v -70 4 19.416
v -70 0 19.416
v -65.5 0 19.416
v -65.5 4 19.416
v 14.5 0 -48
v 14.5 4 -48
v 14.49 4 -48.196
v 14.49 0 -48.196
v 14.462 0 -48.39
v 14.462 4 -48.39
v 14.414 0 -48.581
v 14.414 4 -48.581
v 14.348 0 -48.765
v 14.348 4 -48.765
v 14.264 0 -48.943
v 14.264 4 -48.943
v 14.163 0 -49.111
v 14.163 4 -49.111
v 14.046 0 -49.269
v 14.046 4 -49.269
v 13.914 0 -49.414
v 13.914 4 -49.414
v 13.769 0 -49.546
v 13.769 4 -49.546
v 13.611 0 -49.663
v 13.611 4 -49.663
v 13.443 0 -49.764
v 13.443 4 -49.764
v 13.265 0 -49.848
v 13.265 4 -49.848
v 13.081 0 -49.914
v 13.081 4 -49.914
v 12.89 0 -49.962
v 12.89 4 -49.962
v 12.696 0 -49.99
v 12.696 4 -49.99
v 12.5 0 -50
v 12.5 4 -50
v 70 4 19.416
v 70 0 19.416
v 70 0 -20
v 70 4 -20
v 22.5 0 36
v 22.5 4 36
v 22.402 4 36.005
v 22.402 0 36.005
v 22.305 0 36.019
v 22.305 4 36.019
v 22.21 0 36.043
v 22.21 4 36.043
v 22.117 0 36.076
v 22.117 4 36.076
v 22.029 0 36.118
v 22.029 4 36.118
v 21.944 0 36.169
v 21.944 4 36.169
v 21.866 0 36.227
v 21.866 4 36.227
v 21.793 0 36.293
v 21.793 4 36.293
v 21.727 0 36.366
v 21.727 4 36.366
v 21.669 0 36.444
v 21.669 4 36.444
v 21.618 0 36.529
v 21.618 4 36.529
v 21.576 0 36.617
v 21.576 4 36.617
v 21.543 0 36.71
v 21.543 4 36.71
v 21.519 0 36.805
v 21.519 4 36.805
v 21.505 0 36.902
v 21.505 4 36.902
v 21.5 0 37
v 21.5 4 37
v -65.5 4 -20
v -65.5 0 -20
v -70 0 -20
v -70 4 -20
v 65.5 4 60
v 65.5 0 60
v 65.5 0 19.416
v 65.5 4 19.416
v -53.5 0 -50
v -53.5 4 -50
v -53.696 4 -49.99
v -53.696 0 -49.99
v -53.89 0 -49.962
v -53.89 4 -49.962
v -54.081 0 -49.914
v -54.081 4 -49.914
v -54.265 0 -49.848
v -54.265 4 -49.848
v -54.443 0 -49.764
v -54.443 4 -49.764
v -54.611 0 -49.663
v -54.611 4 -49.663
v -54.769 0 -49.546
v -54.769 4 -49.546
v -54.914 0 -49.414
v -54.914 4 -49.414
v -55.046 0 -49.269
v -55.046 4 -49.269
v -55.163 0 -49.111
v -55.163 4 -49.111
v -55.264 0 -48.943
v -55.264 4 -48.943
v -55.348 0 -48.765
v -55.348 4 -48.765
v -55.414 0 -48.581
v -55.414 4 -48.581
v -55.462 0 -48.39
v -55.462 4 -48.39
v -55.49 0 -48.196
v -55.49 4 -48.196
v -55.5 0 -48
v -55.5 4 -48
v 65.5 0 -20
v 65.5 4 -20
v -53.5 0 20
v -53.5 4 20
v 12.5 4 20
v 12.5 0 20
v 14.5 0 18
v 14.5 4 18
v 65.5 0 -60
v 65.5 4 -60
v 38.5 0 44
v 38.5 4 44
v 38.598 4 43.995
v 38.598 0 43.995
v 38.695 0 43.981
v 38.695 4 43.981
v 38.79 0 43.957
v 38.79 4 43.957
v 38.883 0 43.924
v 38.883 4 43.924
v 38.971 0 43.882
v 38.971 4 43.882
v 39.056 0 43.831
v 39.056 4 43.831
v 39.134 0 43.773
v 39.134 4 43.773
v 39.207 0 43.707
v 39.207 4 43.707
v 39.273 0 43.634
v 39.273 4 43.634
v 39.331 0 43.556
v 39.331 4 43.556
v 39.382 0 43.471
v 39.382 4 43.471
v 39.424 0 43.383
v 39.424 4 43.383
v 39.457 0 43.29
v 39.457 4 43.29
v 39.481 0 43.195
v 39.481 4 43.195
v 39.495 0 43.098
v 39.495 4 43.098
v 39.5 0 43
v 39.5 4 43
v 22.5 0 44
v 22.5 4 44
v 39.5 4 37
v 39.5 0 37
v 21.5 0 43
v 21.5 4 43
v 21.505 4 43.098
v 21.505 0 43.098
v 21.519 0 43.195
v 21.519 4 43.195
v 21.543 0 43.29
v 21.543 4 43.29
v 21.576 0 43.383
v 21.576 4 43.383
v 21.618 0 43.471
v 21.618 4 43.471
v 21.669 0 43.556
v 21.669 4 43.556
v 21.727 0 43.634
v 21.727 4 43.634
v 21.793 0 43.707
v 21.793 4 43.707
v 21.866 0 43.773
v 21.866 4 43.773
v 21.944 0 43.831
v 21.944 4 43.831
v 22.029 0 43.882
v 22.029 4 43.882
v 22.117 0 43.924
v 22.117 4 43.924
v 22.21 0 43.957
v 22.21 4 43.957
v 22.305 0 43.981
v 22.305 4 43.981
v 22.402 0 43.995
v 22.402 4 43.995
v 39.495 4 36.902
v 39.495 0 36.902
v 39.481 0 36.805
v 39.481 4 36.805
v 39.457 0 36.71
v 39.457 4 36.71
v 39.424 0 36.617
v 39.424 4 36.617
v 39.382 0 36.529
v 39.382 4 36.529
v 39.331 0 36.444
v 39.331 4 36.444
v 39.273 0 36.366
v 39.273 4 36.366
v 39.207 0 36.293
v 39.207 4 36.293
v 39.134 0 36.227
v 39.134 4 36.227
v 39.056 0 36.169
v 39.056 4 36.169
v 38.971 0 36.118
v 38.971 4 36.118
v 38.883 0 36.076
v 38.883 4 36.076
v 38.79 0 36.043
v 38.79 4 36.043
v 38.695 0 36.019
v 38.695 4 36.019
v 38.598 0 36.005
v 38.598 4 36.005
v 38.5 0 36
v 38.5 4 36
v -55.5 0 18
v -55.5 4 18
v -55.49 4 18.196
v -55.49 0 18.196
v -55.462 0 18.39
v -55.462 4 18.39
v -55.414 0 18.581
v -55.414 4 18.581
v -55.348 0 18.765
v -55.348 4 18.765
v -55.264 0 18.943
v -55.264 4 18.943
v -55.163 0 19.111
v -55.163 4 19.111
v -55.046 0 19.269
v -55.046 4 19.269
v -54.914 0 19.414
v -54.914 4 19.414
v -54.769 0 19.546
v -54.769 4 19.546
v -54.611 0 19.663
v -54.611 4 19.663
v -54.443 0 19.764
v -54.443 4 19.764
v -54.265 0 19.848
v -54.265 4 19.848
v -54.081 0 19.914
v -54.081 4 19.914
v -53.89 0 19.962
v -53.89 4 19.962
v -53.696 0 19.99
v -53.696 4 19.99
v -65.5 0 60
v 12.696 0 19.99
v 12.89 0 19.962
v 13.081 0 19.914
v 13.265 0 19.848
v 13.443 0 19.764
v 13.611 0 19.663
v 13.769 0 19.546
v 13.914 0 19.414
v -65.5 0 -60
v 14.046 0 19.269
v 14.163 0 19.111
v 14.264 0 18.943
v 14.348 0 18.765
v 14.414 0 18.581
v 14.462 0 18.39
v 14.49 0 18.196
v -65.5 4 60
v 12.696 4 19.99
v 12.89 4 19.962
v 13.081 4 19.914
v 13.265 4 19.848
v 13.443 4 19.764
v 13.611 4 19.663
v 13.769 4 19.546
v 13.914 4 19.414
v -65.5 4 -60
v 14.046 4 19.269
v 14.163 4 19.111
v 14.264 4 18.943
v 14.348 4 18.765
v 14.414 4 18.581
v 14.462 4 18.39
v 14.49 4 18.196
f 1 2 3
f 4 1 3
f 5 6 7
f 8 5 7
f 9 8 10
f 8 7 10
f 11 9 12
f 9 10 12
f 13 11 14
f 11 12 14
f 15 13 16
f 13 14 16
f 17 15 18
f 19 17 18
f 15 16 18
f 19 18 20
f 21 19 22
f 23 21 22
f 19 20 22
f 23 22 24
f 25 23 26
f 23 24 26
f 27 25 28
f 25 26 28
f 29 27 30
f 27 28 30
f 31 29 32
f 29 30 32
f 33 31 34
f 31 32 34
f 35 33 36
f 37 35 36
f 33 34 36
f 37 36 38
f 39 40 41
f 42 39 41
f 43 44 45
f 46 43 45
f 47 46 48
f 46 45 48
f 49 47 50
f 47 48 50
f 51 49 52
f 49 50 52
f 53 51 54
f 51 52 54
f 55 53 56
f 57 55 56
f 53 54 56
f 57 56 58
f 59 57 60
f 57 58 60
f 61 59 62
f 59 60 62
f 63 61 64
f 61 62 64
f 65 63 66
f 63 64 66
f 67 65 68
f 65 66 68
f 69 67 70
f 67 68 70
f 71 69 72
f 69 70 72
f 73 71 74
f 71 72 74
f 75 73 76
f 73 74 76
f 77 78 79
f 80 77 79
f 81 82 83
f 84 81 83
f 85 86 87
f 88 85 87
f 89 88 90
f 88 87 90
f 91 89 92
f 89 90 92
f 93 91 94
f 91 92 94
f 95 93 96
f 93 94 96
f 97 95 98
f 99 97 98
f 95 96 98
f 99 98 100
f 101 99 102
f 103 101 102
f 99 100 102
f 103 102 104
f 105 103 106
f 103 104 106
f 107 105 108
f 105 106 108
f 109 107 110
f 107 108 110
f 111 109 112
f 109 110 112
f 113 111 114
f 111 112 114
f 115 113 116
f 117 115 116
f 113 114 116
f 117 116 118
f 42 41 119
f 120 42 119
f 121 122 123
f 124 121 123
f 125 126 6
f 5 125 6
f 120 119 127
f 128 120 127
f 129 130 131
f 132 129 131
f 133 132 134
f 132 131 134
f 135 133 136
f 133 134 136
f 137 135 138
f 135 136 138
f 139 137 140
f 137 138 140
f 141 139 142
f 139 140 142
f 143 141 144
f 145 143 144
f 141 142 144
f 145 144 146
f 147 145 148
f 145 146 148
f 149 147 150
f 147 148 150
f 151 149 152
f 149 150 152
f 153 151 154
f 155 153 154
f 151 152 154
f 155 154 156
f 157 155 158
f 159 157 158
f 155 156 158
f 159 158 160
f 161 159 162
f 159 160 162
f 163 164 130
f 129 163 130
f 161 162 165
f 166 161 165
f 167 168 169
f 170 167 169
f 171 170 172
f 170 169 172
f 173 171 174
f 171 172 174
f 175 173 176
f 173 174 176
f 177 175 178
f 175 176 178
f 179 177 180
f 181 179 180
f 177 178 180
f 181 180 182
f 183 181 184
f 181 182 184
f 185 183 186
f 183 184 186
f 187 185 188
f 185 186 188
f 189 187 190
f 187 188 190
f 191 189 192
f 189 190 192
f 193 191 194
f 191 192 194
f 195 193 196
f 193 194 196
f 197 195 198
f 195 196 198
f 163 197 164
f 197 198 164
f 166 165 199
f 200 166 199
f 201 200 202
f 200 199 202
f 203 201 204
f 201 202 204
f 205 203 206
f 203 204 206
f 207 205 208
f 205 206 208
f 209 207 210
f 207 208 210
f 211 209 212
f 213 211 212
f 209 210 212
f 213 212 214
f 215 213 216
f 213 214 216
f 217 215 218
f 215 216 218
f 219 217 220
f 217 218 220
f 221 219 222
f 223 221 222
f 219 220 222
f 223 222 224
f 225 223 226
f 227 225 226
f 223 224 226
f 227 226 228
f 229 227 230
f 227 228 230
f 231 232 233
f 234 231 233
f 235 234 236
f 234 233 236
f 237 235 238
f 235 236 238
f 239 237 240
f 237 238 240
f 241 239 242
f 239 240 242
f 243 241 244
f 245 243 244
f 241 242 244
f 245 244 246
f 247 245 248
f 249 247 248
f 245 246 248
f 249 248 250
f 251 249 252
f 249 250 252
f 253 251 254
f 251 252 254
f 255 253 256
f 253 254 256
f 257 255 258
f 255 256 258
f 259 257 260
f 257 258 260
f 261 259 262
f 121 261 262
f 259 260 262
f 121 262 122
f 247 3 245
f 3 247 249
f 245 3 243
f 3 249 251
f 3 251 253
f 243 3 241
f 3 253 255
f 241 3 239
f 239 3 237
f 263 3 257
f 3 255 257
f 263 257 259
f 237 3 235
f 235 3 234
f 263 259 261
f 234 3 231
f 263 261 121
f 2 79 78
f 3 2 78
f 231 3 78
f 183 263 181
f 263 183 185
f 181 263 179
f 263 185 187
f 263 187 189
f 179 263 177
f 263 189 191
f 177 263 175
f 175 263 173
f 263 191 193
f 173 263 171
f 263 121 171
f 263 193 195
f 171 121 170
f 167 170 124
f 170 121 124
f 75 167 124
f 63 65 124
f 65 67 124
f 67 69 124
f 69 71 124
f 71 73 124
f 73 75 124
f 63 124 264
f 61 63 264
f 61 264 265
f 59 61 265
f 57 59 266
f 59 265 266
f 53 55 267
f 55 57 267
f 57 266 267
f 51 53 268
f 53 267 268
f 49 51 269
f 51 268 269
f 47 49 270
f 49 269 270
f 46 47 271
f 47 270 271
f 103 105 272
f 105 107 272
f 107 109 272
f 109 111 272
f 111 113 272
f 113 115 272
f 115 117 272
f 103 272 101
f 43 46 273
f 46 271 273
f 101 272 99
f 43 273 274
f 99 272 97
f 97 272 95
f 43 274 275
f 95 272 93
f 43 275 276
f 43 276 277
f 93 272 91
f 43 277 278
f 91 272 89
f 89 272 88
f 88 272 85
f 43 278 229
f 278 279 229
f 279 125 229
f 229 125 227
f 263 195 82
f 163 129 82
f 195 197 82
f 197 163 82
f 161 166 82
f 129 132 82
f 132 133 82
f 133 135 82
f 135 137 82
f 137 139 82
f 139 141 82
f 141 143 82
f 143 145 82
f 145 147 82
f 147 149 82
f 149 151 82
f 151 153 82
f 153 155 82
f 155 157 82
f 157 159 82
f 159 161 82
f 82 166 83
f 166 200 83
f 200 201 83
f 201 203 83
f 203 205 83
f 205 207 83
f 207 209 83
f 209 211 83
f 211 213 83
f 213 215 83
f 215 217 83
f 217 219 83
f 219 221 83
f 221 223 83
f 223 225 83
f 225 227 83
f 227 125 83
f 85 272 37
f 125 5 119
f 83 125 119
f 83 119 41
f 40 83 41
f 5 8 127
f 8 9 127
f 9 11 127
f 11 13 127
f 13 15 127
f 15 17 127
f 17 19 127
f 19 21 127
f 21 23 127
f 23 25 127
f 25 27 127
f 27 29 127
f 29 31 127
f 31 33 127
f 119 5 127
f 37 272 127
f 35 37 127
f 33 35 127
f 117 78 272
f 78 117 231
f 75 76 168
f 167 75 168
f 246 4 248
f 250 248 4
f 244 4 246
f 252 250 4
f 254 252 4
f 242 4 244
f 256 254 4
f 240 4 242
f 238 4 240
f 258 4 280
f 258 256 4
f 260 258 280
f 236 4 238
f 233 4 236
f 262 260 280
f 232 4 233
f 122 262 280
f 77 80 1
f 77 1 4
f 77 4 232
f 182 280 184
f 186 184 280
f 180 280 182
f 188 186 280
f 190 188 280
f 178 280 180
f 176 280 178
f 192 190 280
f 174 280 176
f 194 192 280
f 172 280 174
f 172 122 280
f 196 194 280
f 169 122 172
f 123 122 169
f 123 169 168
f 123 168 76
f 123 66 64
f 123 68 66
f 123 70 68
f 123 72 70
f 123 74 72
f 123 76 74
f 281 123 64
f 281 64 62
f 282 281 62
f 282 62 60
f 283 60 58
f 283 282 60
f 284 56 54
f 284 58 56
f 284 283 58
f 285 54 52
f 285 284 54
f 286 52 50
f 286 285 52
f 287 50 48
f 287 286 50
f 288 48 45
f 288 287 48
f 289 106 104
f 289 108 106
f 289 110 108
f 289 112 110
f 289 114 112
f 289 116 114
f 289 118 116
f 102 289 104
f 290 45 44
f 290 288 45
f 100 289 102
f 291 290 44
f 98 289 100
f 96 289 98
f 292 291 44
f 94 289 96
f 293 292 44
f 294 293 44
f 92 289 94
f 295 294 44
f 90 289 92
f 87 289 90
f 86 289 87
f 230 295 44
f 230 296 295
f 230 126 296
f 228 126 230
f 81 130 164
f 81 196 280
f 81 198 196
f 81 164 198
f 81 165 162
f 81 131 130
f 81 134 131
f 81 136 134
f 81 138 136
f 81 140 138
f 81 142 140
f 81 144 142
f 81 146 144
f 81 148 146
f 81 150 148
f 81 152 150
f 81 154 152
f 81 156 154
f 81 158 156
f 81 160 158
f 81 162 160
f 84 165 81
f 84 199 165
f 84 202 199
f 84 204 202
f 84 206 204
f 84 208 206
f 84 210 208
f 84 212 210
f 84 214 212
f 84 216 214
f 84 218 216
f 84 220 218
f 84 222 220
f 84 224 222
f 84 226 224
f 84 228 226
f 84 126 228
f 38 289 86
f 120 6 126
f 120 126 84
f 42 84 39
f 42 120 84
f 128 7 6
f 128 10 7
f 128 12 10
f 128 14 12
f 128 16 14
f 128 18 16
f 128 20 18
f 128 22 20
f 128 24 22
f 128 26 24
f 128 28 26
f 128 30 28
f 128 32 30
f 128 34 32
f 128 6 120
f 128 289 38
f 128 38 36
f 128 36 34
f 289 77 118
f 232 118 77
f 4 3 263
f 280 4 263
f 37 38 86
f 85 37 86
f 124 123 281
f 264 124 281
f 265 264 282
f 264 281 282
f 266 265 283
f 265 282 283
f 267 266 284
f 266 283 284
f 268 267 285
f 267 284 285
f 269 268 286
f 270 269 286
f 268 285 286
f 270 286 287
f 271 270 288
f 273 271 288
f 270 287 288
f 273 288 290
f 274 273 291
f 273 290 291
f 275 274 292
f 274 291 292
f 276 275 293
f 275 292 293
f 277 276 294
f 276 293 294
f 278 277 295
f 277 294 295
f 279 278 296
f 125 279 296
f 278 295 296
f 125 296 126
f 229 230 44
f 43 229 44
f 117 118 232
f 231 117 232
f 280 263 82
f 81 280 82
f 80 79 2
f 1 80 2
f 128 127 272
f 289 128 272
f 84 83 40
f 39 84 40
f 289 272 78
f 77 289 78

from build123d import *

# Parameters (mm, degrees)
BOSS_EXTRUDE1_DEPTH = 4
CUT_EXTRUDE1_DEPTH  = 5


with BuildPart() as part:
    # Sketch1 → Boss-Extrude1 (new body)
    with BuildSketch(Plane(origin=(0, 0, 0), x_dir=(1, 0, 0), z_dir=(0, 1, 0))):
        Polygon((-65.5, 20), (-70, 20), (-70, -19.415515436), (-65.5, -19.415515436), (-65.5, -60), (65.5, -60), (65.5, -19.415515436), (70, -19.415515436), (70, 20), (65.5, 20), (65.5, 60), (-65.5, 60), align=None)
    extrude(amount=BOSS_EXTRUDE1_DEPTH)

    # Sketch2 → Cut-Extrude1 (cut)
    with BuildSketch(Plane(origin=(0, 4, 0), x_dir=(1, 0, 0), z_dir=(0, 1, 0))):
        with BuildLine():
            Line((-53.5, -20), (12.5, -20))
            ThreePointArc((12.5, -20), (13.914213562, -19.414213562), (14.5, -18))
            Line((14.5, -18), (14.5, 48))
            ThreePointArc((14.5, 48), (13.914213562, 49.414213562), (12.5, 50))
            Line((12.5, 50), (-53.5, 50))
            ThreePointArc((-53.5, 50), (-54.914213562, 49.414213562), (-55.5, 48))
            Line((-55.5, 48), (-55.5, -18))
            ThreePointArc((-55.5, -18), (-54.914213562, -19.414213562), (-53.5, -20))
        make_face()
        with BuildLine():
            Line((22.5, -44), (38.5, -44))
            ThreePointArc((38.5, -44), (39.207106781, -43.707106781), (39.5, -43))
            Line((39.5, -43), (39.5, -37))
            ThreePointArc((39.5, -37), (39.207106781, -36.292893219), (38.5, -36))
            Line((38.5, -36), (22.5, -36))
            ThreePointArc((22.5, -36), (21.792893219, -36.292893219), (21.5, -37))
            Line((21.5, -37), (21.5, -43))
            ThreePointArc((21.5, -43), (21.792893219, -43.707106781), (22.5, -44))
        make_face()
    extrude(amount=-CUT_EXTRUDE1_DEPTH, mode=Mode.SUBTRACT)


solid = part.part
